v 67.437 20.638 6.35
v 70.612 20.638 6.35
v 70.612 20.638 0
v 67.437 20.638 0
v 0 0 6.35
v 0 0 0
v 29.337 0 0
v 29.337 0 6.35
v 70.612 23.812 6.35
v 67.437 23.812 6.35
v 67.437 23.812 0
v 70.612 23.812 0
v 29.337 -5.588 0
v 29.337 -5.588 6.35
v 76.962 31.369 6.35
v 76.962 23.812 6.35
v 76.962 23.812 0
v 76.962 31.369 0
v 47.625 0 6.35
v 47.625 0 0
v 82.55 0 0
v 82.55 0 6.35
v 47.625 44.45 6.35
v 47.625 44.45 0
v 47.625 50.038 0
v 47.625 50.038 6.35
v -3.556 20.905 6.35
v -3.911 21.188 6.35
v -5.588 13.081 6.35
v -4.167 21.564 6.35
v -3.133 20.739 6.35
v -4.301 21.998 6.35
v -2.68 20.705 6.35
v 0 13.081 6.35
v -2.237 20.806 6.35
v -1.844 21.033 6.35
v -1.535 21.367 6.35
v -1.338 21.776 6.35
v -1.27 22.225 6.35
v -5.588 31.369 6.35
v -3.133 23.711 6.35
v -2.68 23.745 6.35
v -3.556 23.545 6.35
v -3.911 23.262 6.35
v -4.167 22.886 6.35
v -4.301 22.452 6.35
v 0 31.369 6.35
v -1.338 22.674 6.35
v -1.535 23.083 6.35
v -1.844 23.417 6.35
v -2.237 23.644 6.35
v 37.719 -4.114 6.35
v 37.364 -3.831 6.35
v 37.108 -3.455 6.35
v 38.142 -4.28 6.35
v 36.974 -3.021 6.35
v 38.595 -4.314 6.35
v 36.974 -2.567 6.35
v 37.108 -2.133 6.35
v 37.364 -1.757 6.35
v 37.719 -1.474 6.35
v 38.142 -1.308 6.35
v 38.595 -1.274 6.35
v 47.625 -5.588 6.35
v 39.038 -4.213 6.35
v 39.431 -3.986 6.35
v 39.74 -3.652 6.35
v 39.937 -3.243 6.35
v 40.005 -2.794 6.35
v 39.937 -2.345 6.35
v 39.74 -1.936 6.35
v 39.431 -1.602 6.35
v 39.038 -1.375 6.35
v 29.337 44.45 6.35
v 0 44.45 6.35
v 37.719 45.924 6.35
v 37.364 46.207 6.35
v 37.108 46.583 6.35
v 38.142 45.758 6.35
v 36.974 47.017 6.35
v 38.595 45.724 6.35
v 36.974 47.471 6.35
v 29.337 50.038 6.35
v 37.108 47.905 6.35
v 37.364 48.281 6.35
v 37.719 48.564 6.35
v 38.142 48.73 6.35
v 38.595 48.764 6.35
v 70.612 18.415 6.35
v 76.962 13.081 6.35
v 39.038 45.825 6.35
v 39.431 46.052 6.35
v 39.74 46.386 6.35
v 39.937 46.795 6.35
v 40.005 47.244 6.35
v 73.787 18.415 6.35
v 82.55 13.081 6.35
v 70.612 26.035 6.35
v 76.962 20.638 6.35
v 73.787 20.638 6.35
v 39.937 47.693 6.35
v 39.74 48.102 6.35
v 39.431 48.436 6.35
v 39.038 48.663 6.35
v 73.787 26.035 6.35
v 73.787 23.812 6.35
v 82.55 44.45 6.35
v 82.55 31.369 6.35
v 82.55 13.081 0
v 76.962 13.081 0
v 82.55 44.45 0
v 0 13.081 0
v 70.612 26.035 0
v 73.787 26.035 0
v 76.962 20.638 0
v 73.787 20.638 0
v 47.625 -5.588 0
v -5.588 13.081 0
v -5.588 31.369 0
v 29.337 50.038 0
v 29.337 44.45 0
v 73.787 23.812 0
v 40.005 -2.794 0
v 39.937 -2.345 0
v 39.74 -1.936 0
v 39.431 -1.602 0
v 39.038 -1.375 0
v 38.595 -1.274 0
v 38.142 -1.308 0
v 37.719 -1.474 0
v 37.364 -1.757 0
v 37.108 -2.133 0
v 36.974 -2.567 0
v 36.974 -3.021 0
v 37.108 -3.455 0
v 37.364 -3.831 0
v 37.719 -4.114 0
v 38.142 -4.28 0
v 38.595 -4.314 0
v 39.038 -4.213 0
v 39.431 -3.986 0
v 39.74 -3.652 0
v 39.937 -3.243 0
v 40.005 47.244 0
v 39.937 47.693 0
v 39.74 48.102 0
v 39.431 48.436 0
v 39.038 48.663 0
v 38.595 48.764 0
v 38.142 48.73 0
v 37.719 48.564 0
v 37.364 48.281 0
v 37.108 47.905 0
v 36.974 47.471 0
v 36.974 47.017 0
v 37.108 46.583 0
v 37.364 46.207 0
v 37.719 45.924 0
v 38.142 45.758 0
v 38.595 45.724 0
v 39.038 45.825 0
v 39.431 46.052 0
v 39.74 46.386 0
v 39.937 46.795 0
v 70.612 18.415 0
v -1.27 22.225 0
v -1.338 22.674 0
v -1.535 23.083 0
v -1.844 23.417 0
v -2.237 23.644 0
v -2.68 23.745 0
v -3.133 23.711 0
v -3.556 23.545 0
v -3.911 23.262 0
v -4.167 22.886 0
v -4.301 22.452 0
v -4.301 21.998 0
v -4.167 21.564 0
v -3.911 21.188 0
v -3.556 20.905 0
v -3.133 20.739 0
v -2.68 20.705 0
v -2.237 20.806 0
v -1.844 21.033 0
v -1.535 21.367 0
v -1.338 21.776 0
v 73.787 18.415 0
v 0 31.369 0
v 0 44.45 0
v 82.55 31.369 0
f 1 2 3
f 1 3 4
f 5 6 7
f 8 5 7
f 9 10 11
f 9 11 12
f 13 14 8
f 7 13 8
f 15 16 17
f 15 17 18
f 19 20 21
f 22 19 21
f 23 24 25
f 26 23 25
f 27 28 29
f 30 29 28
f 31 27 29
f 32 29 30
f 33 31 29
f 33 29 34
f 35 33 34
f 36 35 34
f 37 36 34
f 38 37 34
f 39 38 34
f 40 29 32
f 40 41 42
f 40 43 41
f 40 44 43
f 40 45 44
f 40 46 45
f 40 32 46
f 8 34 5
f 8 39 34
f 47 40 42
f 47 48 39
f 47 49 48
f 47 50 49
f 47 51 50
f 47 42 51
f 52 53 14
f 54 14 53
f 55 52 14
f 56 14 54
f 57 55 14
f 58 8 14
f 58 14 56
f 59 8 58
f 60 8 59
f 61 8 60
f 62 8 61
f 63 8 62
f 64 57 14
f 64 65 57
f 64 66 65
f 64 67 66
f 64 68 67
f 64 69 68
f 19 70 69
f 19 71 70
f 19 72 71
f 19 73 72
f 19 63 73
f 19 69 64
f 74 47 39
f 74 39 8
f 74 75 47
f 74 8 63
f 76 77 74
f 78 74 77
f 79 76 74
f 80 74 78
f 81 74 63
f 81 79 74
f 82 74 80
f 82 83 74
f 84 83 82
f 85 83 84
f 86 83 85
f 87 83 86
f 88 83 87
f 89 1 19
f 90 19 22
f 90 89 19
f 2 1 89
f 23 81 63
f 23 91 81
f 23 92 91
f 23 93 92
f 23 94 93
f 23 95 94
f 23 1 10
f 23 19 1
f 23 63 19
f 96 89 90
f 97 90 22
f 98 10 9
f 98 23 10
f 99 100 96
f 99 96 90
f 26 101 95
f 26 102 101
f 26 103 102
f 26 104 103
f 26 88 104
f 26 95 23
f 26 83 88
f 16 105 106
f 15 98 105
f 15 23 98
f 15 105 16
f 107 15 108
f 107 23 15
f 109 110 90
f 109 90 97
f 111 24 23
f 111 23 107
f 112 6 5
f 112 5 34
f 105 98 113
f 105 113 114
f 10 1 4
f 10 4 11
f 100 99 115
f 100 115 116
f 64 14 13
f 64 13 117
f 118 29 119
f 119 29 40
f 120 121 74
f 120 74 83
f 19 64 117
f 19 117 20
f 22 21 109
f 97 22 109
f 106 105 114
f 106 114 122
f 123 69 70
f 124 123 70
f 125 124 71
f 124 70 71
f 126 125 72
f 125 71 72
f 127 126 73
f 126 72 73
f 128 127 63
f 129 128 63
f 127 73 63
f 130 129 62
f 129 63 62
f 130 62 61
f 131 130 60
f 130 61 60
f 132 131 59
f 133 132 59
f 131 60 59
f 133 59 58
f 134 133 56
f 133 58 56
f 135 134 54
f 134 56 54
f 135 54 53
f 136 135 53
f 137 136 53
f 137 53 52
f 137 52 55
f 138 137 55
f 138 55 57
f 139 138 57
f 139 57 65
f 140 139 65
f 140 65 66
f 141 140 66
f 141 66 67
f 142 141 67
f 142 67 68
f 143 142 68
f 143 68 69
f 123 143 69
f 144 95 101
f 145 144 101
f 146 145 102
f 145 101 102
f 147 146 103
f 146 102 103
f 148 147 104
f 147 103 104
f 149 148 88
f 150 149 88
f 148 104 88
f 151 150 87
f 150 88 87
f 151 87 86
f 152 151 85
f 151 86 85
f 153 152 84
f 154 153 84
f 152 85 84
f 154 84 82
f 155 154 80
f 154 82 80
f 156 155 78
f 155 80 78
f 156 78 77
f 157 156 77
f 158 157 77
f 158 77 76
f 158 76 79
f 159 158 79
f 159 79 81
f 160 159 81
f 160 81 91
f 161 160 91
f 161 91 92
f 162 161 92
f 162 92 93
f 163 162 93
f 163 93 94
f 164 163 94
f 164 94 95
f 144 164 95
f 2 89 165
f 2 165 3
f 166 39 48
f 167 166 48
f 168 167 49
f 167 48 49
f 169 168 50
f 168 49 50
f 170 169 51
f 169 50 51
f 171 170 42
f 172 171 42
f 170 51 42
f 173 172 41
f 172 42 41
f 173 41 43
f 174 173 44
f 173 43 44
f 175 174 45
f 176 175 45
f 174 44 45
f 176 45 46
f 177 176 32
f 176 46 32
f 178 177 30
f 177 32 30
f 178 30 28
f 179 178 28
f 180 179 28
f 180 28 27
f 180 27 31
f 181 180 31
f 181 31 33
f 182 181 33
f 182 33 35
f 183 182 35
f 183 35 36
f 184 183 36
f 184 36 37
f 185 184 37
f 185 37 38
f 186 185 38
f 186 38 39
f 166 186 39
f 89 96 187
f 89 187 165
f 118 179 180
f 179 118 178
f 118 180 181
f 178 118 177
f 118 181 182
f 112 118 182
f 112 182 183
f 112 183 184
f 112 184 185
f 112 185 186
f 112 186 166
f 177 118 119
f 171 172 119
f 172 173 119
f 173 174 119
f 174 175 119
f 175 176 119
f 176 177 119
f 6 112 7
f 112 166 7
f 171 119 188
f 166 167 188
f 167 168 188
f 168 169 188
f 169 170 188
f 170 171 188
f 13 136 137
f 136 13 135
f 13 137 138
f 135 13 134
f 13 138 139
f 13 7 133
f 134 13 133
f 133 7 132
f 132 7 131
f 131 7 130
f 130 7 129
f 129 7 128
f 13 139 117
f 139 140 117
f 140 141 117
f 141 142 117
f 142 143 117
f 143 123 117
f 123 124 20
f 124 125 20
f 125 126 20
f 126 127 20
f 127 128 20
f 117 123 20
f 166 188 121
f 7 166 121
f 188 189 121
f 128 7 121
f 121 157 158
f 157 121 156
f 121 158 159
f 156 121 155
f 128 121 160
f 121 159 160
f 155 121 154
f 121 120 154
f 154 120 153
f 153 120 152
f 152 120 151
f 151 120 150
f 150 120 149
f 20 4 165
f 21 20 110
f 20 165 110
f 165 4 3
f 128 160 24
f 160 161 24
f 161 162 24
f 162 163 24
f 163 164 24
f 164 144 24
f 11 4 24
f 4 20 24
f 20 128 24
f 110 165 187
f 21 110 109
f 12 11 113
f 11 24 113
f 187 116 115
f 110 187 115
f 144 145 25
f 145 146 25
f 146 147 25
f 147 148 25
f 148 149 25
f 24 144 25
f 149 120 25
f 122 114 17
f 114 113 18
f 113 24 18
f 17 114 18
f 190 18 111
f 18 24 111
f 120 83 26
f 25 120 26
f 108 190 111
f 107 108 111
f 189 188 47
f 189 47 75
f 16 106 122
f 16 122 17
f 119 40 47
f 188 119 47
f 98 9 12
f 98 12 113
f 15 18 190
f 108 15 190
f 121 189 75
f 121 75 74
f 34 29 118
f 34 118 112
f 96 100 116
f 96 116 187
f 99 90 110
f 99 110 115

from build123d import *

# Parameters (mm, degrees)
SKETCH1_W           = 82.55
SKETCH1_H           = 44.45
BOSS_EXTRUDE1_DEPTH = 6.35
SKETCH2_W           = 5.588
SKETCH2_H           = 18.288
BOSS_EXTRUDE2_DEPTH = 6.35
SKETCH5_W           = 18.288
SKETCH5_H           = 5.588
BOSS_EXTRUDE3_DEPTH = 6.35
SKETCH3_W           = 5.588
SKETCH3_H           = 18.288
CUT_EXTRUDE1_DEPTH  = 97.739994025
SKETCH6_R           = 1.524
CUT_EXTRUDE2_DEPTH  = 97.739994025


with BuildPart() as part:
    # Sketch1 → Boss-Extrude1 (new body)
    with BuildSketch(Plane.XY):
        with Locations((41.275, 22.225)):
            Rectangle(SKETCH1_W, SKETCH1_H)
    extrude(amount=BOSS_EXTRUDE1_DEPTH)

    # Sketch2 → Boss-Extrude2 (add)
    with BuildSketch(Plane.XY.offset(6.35)):
        with Locations((-2.794, 22.225)):
            Rectangle(SKETCH2_W, SKETCH2_H)
    extrude(amount=-BOSS_EXTRUDE2_DEPTH)

    # Sketch5 → Boss-Extrude3 (add)
    with BuildSketch(Plane.XY.offset(6.35)):
        with Locations((38.481, 47.244)):
            Rectangle(SKETCH5_W, SKETCH5_H)
        with Locations((38.481, -2.794)):
            Rectangle(SKETCH5_W, SKETCH5_H)
    extrude(amount=-BOSS_EXTRUDE3_DEPTH)

    # Sketch3 → Cut-Extrude1 (cut, through all)
    with BuildSketch(Plane.XY.offset(6.35)):
        with Locations((79.756, 22.225)):
            Rectangle(SKETCH3_W, SKETCH3_H)
    extrude(amount=-CUT_EXTRUDE1_DEPTH, mode=Mode.SUBTRACT)

    # Sketch6 → Cut-Extrude2 (cut, through all)
    with BuildSketch(Plane.XY.offset(6.35)):
        with Locations((-2.794, 22.225)):
            Circle(SKETCH6_R)
        with Locations((38.481, -2.794)):
            Circle(SKETCH6_R)
        with Locations((38.481, 47.244)):
            Circle(SKETCH6_R)
        Polygon((67.437, 23.8125), (70.612, 23.8125), (70.612, 26.035), (73.787, 26.035), (73.787, 23.8125), (76.962, 23.8125), (76.962, 20.6375), (73.787, 20.6375), (73.787, 18.415), (70.612, 18.415), (70.612, 20.6375), (67.437, 20.6375), align=None)
    extrude(amount=-CUT_EXTRUDE2_DEPTH, mode=Mode.SUBTRACT)


solid = part.part
